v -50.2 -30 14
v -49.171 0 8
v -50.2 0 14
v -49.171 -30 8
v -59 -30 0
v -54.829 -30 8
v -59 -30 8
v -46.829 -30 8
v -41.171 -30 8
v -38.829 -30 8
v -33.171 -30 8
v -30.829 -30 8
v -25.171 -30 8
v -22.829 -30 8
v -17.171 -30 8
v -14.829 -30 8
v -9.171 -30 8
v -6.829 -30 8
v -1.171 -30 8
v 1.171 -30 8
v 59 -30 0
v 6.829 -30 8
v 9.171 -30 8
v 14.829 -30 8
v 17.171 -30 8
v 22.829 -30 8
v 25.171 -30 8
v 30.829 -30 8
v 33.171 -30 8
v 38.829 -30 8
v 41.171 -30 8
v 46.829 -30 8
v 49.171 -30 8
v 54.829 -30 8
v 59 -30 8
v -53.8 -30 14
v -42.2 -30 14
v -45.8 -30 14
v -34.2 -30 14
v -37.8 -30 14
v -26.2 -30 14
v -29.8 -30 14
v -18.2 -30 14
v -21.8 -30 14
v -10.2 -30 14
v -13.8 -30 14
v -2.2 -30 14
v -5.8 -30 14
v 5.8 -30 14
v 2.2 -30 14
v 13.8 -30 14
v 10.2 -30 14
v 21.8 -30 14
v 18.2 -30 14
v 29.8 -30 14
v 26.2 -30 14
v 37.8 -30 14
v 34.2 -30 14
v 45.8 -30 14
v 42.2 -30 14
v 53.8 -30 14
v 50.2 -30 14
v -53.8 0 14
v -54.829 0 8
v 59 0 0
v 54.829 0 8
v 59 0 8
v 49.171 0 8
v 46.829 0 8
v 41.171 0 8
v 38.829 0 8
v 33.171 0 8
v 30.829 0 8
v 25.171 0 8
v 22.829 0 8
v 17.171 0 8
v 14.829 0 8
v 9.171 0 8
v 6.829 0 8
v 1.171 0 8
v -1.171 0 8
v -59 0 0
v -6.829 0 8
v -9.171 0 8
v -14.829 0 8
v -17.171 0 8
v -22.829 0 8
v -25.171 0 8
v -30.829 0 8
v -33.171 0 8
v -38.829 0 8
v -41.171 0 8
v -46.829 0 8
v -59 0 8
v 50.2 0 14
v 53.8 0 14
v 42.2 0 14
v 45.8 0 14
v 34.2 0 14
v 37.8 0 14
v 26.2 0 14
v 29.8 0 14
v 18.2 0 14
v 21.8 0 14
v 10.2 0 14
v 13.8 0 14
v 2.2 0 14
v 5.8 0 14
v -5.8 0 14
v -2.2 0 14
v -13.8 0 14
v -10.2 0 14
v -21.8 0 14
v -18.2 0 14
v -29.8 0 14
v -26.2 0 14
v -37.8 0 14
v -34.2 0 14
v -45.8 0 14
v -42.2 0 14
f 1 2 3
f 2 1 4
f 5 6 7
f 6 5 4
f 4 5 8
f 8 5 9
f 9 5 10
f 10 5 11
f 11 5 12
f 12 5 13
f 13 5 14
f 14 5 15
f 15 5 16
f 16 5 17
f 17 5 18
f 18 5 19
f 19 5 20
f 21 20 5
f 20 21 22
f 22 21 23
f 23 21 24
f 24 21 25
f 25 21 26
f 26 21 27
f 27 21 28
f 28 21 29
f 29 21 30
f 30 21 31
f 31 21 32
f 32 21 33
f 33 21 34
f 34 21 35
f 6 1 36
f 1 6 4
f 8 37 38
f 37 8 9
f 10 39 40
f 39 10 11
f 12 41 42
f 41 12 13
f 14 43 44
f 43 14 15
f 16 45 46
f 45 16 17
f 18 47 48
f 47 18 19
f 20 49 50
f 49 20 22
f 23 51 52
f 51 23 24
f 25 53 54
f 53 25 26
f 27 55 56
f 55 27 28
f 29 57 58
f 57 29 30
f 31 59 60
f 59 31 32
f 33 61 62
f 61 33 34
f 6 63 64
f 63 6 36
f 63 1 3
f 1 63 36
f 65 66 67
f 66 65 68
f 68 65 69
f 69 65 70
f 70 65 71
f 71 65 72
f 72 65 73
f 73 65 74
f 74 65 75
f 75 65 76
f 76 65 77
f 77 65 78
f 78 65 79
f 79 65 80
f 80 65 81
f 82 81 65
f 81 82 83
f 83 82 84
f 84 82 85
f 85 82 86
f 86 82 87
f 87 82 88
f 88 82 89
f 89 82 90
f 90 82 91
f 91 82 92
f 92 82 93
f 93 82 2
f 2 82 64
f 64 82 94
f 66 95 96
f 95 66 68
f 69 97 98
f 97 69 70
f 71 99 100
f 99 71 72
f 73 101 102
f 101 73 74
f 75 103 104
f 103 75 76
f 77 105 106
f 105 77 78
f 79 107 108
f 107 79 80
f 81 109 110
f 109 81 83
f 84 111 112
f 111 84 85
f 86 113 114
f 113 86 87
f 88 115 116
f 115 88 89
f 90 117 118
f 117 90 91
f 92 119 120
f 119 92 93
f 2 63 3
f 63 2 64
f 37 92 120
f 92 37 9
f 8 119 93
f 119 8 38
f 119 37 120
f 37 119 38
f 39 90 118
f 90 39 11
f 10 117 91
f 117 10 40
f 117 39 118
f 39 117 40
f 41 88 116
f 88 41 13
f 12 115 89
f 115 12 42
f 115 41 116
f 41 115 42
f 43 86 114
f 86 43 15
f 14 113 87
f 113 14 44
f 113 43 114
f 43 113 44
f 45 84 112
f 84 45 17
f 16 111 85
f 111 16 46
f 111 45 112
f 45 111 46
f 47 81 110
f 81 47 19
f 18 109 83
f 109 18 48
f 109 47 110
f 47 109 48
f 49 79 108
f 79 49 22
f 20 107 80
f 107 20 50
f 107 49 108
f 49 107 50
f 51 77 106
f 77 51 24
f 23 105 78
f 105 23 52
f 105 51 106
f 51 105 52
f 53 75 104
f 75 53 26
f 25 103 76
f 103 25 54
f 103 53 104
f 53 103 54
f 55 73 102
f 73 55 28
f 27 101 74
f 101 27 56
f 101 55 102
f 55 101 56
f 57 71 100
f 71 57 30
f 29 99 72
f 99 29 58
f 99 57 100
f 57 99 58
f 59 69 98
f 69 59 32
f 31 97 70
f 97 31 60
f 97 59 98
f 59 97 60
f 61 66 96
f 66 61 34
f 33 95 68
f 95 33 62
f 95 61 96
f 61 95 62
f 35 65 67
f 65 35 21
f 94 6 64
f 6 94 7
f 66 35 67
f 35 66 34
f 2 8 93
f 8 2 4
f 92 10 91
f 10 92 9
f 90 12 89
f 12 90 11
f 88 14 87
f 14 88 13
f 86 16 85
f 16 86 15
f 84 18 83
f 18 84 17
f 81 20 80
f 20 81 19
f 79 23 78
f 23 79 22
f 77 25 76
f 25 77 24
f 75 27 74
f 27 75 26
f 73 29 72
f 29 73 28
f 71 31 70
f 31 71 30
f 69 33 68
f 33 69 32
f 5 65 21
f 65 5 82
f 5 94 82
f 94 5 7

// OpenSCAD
$fn = 32;

// ----------------------------------------------------------------------
// Toothed rack, 14 teeth
// 8 mm pitch, 6 mm teeth
// ----------------------------------------------------------------------

// --- parameters (mm) ---
bar_w = 30;     // bar width (Y)
bar_h = 8;      // bar height (Z)
teeth = 14;     // number of teeth
pitch = 8;      // tooth pitch
tooth_h = 6;    // tooth height above the bar
root_w = 6;     // tooth width at the root
crest_w = 3.6;  // tooth width at the crest

// --- derived feature positions (mm) ---
span = (teeth - 1) * pitch;  // = 104   distance between the outer teeth
bar_l = span + root_w + 8;   // = 118   bar length: teeth plus 4 mm at each end
tooth_x = -span / 2;         // = -52   X of the first tooth
height = bar_h + tooth_h;    // = 14   overall height
feature_centers = [
  [tooth_x + 0 * pitch, -bar_w / 2],
  [tooth_x + 1 * pitch, -bar_w / 2],
  [tooth_x + 2 * pitch, -bar_w / 2],
  [tooth_x + 3 * pitch, -bar_w / 2],
  [tooth_x + 4 * pitch, -bar_w / 2],
  [tooth_x + 5 * pitch, -bar_w / 2],
  [tooth_x + 6 * pitch, -bar_w / 2],
  [tooth_x + 7 * pitch, -bar_w / 2],
  [tooth_x + 8 * pitch, -bar_w / 2],
  [tooth_x + 9 * pitch, -bar_w / 2],
  [tooth_x + 10 * pitch, -bar_w / 2],
  [tooth_x + 11 * pitch, -bar_w / 2],
  [tooth_x + 12 * pitch, -bar_w / 2],
  [tooth_x + 13 * pitch, -bar_w / 2]
];   // tooth centre line, drives the tooth loop

// bar with a rack of teeth, one extruded trapezoium per centre
module rack_tooth() {
  linear_extrude(height = bar_w)
    polygon(points = [
      [0, 0],
      [root_w, 0],
      [root_w / 2 + crest_w / 2, tooth_h + 1],
      [root_w / 2 - crest_w / 2, tooth_h + 1]
    ]);
}

union() {
  translate([-bar_l / 2, -bar_w, 0]) cube([bar_l, bar_w, bar_h]);
  for (centre = feature_centers)
    translate([centre[0] - root_w / 2, 0, bar_h - 1]) rotate([90, 0, 0]) rack_tooth();
}
